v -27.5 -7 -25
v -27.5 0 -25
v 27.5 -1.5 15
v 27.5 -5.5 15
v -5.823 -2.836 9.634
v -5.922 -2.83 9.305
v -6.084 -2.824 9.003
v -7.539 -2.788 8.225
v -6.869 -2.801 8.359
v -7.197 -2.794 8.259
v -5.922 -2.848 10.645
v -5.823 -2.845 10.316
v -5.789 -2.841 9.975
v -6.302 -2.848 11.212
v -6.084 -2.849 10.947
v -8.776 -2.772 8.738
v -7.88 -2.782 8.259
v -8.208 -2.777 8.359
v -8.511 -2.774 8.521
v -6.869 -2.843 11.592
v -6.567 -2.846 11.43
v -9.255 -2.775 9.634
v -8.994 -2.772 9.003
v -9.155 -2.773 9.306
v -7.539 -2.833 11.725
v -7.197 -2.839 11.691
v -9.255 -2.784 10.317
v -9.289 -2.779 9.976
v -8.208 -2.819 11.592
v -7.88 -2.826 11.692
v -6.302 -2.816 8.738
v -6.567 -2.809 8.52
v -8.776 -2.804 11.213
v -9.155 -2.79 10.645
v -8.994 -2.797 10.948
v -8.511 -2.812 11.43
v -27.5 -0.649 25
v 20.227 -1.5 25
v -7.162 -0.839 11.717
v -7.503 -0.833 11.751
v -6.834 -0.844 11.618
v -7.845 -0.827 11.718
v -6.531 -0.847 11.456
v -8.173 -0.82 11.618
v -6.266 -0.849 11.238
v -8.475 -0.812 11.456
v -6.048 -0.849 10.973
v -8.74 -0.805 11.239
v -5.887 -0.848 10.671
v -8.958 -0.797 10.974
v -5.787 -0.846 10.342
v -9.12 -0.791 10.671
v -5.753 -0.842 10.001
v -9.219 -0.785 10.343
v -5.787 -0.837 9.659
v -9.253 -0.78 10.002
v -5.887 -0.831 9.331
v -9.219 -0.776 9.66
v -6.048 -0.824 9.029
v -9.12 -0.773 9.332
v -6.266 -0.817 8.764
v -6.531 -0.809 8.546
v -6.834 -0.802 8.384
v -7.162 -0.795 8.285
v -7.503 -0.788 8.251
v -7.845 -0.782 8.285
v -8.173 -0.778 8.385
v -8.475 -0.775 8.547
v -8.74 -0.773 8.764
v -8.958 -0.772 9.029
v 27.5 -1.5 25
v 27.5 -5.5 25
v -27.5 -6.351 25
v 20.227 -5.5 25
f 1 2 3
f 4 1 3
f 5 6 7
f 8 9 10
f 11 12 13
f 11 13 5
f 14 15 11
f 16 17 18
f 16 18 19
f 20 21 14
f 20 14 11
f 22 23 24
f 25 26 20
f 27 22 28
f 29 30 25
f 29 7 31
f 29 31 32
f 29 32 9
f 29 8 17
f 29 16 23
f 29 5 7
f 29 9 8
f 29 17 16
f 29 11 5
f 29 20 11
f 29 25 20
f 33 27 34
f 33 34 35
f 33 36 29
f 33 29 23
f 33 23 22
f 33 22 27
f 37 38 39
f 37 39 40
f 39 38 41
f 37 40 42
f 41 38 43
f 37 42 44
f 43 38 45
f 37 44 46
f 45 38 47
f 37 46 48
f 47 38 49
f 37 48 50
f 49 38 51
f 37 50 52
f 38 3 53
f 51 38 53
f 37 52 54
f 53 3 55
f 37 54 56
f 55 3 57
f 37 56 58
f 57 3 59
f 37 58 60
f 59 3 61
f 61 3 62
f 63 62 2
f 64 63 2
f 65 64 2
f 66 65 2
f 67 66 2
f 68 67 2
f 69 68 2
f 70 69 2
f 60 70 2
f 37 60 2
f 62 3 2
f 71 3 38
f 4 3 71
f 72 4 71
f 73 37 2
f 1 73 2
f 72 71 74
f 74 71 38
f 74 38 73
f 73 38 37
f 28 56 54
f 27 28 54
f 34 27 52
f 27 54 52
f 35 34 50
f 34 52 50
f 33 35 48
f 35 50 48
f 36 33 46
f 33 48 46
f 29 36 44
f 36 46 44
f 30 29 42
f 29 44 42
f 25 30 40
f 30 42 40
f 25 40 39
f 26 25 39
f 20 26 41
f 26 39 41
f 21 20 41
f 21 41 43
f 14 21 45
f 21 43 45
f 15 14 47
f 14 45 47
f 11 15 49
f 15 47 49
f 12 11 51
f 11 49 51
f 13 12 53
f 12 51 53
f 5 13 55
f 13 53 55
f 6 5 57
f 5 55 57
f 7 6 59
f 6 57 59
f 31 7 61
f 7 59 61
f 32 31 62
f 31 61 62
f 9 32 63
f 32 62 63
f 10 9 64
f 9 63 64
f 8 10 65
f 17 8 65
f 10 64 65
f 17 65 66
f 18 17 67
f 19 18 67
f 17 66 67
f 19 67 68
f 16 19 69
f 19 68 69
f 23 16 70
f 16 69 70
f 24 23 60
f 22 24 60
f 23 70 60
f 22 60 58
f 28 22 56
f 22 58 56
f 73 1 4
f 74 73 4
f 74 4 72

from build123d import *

# Parameters (mm, degrees)
F1_DEPTH = 7
F3_DEPTH = 40.4378042152
F4_DEPTH = 5.8827169768
F5_R     = 1.75
F6_DEPTH = 2


with BuildPart() as f1:
    # F0 (on Front) → F1 (new body)
    with BuildSketch(Plane.XZ):
        Polygon((27.5, 15), (27.5, 25), (-27.5, 25), (-27.5, -25), align=None)
    extrude(amount=F1_DEPTH)

    # F2 (on face) → F3 (cut, through all)
    with BuildSketch(Plane(origin=(2.3783783784, 0, -3.2702702703), x_dir=(0.8087360843, 0, 0.5881716977), z_dir=(0.5881716977, 0, -0.8087360843))):
        Polygon((31.0628177835, 7), (-36.9445347602, 7), (31.0628177835, 5.5), align=None)
        Polygon((31.0628177835, 1.5), (-36.9445347602, 0), (31.0628177835, 0), align=None)
    extrude(amount=-F3_DEPTH, mode=Mode.SUBTRACT)

    # F4 (cut, through all): faces of the model
    f4_faces = [f1.faces().sort_by_distance(p)[0] for p in [
        (23.8636363636, -6.25, 20),
        (23.8636363636, -0.75, 20),
    ]]
    extrude(f4_faces, amount=-F4_DEPTH, mode=Mode.SUBTRACT)

    # F5 (on face) → F6 (cut)
    with BuildSketch(Plane(origin=(-0.0145283595, -0.8144686369, -0.0105660796), x_dir=(-0.9998409705, 0.017832, 0.0002313341), z_dir=(0.0178335005, 0.9997568455, 0.0129698185))):
        with Locations((7.489843337, 10.0109374025)):
            Circle(F5_R)
    extrude(amount=-F6_DEPTH, mode=Mode.SUBTRACT)


solid = f1.part
